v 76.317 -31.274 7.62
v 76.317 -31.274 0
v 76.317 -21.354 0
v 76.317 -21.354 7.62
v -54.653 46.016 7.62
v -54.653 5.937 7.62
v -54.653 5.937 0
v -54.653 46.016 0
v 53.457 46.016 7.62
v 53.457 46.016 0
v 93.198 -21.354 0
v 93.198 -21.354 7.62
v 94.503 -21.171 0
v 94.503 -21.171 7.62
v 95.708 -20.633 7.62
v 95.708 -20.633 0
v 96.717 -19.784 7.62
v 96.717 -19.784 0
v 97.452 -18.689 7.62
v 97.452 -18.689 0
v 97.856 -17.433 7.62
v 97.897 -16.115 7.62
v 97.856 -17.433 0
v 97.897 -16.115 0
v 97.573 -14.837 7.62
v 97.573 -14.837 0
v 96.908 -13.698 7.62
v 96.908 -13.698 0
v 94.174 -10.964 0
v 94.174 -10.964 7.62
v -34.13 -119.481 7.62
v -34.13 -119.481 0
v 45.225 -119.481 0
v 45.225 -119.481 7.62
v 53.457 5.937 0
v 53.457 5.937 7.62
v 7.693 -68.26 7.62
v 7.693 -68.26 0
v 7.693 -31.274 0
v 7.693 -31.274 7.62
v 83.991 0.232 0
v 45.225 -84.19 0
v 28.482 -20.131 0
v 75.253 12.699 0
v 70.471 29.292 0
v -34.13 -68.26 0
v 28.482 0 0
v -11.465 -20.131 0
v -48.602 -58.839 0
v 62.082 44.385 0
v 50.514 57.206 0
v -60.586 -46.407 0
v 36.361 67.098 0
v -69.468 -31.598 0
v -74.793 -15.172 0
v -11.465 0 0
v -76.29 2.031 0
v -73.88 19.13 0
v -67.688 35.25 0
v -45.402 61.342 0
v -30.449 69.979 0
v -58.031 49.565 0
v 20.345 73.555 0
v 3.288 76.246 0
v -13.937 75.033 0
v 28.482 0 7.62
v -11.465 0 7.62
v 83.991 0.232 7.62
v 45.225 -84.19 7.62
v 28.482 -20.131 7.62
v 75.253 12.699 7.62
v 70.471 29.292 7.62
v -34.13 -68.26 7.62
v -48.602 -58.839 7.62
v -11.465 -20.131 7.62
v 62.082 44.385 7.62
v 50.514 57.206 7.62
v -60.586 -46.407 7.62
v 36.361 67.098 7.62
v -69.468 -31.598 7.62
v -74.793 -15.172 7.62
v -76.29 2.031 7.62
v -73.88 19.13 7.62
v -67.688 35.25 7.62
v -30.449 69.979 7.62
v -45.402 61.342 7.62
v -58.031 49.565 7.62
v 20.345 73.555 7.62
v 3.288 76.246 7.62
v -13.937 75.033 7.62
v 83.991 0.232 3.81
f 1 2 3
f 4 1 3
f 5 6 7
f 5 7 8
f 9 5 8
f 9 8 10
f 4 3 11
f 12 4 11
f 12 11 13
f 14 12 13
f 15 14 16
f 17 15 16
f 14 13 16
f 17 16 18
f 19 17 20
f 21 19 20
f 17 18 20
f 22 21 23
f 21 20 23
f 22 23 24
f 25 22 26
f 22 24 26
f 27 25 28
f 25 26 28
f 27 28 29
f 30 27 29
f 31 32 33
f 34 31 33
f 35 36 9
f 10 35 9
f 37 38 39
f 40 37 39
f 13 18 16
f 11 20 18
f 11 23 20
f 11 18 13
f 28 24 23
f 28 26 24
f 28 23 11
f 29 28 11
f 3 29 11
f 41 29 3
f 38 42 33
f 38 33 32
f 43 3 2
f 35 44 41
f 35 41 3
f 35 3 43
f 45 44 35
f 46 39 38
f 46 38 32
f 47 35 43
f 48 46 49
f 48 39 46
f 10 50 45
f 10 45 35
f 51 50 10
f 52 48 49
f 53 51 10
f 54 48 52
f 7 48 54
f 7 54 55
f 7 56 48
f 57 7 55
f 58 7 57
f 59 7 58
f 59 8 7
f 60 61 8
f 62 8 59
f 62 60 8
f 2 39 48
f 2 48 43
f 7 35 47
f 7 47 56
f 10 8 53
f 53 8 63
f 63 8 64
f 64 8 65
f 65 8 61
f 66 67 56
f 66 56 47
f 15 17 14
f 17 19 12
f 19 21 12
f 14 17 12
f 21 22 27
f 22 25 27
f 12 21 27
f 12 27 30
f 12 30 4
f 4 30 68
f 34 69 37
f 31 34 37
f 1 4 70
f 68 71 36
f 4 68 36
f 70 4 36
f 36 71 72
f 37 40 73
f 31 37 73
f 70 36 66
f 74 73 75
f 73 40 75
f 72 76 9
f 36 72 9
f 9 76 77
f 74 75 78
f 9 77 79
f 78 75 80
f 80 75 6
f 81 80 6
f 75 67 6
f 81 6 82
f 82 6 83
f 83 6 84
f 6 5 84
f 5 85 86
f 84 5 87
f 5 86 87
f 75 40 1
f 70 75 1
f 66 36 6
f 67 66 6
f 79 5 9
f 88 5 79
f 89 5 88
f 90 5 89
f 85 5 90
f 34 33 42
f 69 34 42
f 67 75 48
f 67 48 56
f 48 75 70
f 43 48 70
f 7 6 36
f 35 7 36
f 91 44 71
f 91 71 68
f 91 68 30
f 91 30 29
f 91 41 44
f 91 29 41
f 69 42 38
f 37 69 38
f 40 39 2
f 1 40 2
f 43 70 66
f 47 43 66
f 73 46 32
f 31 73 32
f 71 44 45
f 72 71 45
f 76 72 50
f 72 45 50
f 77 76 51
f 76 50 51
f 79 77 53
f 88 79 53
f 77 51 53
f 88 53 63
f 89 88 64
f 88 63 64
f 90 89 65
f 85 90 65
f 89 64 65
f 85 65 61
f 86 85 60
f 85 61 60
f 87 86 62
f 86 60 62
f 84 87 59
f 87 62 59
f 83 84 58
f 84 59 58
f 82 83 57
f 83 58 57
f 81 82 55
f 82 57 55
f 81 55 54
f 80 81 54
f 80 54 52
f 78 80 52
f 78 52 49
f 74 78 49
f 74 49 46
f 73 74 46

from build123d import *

# Parameters (mm, degrees)
BOSS_EXTRUDE3_DEPTH = 7.62
SKETCH6_W           = 108.110429846
SKETCH6_H           = 40.078189215
SKETCH6_W_2         = 39.947123602
SKETCH6_H_2         = 20.1313586
CUT_EXTRUDE5_DEPTH  = 7.62


with BuildPart() as part:
    # Sketch2 → Boss-Extrude3 (new body)
    with BuildSketch(Plane.XY):
        with BuildLine():
            Line((96.126803593, -12.916705994), (94.17394782, -10.963850221))
            add(Edge.make_bspline(
                [(75.252666665, 12.699131487), (83.268217656, -0.404579698), (94.17394782, -10.963850221)],
                knots=[0, 0, 0, 1, 1, 1], degree=2))
            ThreePointArc((75.252666665, 12.699131487), (-45.402140278, 61.342297308), (-34.129845534, -68.259691067))
            Line((-34.129845534, -68.259691067), (-34.129845534, -119.480702222))
            Line((-34.129845534, -119.480702222), (45.224618014, -119.480702222))
            Line((45.224618014, -119.480702222), (45.224618014, -84.189817543))
            Line((45.224618014, -84.189817543), (7.693042244, -68.259691067))
            Line((7.693042244, -68.259691067), (7.693042244, -31.273550257))
            Line((7.693042244, -31.273550257), (76.316654675, -31.273550257))
            Line((76.316654675, -31.273550257), (76.316654675, -21.354495246))
            Line((76.316654675, -21.354495246), (93.197519934, -21.354495246))
            ThreePointArc((93.197519934, -21.354495246), (97.451679759, -18.688706069), (96.907945902, -13.697848303))
            Line((96.907945902, -13.697848303), (96.126803593, -12.916705994))
        make_face()
    extrude(amount=BOSS_EXTRUDE3_DEPTH)

    # Sketch6 → Cut-Extrude5 (cut)
    with BuildSketch(Plane.XY.offset(7.62)):
        with Locations((-0.597955264, 25.976582243)):
            Rectangle(SKETCH6_W, SKETCH6_H)
        with Locations((8.508452954, -10.0656793)):
            Rectangle(SKETCH6_W_2, SKETCH6_H_2)
    extrude(amount=-CUT_EXTRUDE5_DEPTH, mode=Mode.SUBTRACT)


solid = part.part
